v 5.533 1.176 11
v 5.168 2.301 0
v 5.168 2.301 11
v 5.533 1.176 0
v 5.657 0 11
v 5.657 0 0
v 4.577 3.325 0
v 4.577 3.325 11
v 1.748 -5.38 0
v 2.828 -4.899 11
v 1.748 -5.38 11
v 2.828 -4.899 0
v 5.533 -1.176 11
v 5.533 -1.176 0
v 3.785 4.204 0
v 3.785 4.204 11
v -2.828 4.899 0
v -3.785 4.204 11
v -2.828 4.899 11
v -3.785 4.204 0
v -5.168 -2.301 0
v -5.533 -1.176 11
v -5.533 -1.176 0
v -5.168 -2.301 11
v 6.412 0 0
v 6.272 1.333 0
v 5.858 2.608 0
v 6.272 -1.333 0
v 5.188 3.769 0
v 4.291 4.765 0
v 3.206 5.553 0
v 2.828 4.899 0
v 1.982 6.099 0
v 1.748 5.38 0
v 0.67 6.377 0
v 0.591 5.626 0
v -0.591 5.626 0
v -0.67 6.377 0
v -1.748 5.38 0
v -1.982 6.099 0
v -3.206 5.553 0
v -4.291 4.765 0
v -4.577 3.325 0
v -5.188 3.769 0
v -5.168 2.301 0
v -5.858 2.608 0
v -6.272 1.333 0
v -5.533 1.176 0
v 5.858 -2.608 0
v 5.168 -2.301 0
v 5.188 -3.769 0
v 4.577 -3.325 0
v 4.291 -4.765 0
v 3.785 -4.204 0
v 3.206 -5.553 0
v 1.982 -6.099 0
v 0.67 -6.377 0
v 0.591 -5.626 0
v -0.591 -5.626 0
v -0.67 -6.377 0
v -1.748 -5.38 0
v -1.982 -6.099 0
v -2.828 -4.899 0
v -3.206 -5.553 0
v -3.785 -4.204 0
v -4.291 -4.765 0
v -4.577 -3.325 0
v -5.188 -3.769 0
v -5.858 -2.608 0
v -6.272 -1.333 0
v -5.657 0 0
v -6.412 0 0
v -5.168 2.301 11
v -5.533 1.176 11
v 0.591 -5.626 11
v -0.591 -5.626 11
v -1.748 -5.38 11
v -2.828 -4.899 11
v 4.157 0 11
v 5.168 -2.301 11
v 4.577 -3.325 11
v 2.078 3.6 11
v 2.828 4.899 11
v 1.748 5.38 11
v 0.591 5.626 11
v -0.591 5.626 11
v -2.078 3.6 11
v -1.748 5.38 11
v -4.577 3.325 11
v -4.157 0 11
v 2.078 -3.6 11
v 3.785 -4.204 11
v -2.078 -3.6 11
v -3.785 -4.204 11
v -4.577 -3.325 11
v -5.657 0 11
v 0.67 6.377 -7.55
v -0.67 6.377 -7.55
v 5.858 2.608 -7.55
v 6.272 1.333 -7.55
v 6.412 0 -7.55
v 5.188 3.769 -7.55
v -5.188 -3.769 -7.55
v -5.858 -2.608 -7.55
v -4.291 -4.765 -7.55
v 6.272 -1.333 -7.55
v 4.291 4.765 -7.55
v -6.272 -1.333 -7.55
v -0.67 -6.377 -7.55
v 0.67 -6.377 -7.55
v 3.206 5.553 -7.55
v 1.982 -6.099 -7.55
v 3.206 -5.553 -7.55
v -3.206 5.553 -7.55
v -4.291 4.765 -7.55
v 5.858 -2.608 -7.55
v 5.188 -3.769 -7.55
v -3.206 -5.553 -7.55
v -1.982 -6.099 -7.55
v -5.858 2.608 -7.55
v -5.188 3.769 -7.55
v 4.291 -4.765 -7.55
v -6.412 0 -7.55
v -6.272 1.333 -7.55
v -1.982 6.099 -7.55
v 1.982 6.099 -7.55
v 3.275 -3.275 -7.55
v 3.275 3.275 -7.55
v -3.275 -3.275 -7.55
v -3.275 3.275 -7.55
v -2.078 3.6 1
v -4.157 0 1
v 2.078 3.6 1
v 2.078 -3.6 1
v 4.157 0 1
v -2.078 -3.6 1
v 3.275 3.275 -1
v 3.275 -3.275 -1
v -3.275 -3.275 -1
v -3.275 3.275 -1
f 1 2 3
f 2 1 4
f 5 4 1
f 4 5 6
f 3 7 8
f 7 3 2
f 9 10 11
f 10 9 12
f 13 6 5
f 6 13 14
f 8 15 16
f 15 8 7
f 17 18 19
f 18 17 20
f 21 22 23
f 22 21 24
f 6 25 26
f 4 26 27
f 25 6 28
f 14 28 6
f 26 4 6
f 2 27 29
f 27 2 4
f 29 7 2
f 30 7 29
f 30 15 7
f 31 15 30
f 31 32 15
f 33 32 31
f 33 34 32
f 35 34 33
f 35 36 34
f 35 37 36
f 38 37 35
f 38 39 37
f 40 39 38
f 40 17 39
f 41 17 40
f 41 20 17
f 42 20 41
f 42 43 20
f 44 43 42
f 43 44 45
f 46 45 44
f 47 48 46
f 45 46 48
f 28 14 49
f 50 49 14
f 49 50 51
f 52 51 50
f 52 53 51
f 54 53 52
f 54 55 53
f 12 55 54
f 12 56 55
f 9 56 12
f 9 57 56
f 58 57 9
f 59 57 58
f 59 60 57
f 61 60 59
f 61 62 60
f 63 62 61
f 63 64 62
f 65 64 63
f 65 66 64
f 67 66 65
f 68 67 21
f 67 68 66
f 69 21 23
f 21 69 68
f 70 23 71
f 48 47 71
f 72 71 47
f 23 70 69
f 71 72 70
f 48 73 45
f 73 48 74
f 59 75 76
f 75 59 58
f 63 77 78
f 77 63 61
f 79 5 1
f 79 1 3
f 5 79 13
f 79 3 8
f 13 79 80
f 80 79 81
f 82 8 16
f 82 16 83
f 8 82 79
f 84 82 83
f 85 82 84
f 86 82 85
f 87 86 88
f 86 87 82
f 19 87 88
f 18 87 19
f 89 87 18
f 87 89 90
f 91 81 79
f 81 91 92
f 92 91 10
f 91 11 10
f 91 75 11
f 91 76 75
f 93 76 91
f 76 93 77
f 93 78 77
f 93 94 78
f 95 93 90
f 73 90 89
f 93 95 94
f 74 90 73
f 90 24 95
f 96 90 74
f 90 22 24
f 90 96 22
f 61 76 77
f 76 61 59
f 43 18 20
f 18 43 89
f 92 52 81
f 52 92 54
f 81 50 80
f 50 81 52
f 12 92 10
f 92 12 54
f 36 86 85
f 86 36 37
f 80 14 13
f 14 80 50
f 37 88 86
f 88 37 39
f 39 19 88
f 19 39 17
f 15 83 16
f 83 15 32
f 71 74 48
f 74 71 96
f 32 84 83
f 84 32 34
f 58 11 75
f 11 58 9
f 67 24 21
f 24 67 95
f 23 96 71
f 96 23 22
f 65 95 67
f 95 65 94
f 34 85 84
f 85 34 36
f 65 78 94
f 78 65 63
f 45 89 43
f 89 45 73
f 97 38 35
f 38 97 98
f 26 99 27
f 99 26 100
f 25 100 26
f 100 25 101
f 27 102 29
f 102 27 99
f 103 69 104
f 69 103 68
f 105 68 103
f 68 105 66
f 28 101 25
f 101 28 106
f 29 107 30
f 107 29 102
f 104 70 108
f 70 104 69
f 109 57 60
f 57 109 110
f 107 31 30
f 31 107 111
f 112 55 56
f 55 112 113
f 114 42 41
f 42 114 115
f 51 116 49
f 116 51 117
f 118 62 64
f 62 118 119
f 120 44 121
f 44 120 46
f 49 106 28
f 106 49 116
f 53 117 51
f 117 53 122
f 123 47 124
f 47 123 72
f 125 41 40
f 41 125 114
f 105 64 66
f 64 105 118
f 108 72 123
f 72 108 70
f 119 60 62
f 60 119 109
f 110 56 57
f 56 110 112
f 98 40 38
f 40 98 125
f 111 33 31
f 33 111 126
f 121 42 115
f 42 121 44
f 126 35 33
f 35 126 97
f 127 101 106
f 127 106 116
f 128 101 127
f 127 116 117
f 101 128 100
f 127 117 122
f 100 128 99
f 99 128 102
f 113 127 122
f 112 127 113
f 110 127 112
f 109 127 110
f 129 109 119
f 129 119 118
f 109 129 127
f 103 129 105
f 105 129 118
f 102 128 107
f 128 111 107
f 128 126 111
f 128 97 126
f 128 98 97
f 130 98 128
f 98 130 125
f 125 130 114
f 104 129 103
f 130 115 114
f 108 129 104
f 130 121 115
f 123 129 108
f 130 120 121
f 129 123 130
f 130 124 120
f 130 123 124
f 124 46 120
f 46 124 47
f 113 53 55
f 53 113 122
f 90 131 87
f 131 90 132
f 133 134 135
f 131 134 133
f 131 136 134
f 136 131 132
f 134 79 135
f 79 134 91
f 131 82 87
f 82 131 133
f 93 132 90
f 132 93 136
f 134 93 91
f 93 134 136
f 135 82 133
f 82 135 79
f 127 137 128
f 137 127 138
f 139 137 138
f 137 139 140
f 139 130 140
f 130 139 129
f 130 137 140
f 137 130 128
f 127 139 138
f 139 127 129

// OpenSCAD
//Hex socket (customizable)

// diameter of hole across-flats
size = 7;
// size of drive
drive = 6.35;
// depth of socket
depth = 10;
// drive and socket size tolerance
tolerance = 0.2;

tolSize = size + tolerance;
inscribedSize = tolSize/0.866025;
tolDrive = drive + tolerance;

socketRadius = (inscribedSize+3)/2;
driveRadius = ((tolDrive*1.5)+3)/2;

difference()
{
	union()
	{
		//socket portion
		translate([0,0,(depth+1)/2])
		cylinder(h = depth + 1, r = socketRadius, center = true, $fn = 30);

		//drive portion
		translate([0,0,0-((tolDrive + 1) / 2)])
		cylinder(h = tolDrive + 1, r = driveRadius, center = true, $fn = 30);
	}
	
	//socket hole
	translate([0,0,1])
	linear_extrude(height = depth, center = false)
	circle(r = inscribedSize/2, $fn = 6);

	//drive hole
	translate([0,0,0-(tolDrive/2)-1])
	cube(size = tolDrive, center = true);
}
